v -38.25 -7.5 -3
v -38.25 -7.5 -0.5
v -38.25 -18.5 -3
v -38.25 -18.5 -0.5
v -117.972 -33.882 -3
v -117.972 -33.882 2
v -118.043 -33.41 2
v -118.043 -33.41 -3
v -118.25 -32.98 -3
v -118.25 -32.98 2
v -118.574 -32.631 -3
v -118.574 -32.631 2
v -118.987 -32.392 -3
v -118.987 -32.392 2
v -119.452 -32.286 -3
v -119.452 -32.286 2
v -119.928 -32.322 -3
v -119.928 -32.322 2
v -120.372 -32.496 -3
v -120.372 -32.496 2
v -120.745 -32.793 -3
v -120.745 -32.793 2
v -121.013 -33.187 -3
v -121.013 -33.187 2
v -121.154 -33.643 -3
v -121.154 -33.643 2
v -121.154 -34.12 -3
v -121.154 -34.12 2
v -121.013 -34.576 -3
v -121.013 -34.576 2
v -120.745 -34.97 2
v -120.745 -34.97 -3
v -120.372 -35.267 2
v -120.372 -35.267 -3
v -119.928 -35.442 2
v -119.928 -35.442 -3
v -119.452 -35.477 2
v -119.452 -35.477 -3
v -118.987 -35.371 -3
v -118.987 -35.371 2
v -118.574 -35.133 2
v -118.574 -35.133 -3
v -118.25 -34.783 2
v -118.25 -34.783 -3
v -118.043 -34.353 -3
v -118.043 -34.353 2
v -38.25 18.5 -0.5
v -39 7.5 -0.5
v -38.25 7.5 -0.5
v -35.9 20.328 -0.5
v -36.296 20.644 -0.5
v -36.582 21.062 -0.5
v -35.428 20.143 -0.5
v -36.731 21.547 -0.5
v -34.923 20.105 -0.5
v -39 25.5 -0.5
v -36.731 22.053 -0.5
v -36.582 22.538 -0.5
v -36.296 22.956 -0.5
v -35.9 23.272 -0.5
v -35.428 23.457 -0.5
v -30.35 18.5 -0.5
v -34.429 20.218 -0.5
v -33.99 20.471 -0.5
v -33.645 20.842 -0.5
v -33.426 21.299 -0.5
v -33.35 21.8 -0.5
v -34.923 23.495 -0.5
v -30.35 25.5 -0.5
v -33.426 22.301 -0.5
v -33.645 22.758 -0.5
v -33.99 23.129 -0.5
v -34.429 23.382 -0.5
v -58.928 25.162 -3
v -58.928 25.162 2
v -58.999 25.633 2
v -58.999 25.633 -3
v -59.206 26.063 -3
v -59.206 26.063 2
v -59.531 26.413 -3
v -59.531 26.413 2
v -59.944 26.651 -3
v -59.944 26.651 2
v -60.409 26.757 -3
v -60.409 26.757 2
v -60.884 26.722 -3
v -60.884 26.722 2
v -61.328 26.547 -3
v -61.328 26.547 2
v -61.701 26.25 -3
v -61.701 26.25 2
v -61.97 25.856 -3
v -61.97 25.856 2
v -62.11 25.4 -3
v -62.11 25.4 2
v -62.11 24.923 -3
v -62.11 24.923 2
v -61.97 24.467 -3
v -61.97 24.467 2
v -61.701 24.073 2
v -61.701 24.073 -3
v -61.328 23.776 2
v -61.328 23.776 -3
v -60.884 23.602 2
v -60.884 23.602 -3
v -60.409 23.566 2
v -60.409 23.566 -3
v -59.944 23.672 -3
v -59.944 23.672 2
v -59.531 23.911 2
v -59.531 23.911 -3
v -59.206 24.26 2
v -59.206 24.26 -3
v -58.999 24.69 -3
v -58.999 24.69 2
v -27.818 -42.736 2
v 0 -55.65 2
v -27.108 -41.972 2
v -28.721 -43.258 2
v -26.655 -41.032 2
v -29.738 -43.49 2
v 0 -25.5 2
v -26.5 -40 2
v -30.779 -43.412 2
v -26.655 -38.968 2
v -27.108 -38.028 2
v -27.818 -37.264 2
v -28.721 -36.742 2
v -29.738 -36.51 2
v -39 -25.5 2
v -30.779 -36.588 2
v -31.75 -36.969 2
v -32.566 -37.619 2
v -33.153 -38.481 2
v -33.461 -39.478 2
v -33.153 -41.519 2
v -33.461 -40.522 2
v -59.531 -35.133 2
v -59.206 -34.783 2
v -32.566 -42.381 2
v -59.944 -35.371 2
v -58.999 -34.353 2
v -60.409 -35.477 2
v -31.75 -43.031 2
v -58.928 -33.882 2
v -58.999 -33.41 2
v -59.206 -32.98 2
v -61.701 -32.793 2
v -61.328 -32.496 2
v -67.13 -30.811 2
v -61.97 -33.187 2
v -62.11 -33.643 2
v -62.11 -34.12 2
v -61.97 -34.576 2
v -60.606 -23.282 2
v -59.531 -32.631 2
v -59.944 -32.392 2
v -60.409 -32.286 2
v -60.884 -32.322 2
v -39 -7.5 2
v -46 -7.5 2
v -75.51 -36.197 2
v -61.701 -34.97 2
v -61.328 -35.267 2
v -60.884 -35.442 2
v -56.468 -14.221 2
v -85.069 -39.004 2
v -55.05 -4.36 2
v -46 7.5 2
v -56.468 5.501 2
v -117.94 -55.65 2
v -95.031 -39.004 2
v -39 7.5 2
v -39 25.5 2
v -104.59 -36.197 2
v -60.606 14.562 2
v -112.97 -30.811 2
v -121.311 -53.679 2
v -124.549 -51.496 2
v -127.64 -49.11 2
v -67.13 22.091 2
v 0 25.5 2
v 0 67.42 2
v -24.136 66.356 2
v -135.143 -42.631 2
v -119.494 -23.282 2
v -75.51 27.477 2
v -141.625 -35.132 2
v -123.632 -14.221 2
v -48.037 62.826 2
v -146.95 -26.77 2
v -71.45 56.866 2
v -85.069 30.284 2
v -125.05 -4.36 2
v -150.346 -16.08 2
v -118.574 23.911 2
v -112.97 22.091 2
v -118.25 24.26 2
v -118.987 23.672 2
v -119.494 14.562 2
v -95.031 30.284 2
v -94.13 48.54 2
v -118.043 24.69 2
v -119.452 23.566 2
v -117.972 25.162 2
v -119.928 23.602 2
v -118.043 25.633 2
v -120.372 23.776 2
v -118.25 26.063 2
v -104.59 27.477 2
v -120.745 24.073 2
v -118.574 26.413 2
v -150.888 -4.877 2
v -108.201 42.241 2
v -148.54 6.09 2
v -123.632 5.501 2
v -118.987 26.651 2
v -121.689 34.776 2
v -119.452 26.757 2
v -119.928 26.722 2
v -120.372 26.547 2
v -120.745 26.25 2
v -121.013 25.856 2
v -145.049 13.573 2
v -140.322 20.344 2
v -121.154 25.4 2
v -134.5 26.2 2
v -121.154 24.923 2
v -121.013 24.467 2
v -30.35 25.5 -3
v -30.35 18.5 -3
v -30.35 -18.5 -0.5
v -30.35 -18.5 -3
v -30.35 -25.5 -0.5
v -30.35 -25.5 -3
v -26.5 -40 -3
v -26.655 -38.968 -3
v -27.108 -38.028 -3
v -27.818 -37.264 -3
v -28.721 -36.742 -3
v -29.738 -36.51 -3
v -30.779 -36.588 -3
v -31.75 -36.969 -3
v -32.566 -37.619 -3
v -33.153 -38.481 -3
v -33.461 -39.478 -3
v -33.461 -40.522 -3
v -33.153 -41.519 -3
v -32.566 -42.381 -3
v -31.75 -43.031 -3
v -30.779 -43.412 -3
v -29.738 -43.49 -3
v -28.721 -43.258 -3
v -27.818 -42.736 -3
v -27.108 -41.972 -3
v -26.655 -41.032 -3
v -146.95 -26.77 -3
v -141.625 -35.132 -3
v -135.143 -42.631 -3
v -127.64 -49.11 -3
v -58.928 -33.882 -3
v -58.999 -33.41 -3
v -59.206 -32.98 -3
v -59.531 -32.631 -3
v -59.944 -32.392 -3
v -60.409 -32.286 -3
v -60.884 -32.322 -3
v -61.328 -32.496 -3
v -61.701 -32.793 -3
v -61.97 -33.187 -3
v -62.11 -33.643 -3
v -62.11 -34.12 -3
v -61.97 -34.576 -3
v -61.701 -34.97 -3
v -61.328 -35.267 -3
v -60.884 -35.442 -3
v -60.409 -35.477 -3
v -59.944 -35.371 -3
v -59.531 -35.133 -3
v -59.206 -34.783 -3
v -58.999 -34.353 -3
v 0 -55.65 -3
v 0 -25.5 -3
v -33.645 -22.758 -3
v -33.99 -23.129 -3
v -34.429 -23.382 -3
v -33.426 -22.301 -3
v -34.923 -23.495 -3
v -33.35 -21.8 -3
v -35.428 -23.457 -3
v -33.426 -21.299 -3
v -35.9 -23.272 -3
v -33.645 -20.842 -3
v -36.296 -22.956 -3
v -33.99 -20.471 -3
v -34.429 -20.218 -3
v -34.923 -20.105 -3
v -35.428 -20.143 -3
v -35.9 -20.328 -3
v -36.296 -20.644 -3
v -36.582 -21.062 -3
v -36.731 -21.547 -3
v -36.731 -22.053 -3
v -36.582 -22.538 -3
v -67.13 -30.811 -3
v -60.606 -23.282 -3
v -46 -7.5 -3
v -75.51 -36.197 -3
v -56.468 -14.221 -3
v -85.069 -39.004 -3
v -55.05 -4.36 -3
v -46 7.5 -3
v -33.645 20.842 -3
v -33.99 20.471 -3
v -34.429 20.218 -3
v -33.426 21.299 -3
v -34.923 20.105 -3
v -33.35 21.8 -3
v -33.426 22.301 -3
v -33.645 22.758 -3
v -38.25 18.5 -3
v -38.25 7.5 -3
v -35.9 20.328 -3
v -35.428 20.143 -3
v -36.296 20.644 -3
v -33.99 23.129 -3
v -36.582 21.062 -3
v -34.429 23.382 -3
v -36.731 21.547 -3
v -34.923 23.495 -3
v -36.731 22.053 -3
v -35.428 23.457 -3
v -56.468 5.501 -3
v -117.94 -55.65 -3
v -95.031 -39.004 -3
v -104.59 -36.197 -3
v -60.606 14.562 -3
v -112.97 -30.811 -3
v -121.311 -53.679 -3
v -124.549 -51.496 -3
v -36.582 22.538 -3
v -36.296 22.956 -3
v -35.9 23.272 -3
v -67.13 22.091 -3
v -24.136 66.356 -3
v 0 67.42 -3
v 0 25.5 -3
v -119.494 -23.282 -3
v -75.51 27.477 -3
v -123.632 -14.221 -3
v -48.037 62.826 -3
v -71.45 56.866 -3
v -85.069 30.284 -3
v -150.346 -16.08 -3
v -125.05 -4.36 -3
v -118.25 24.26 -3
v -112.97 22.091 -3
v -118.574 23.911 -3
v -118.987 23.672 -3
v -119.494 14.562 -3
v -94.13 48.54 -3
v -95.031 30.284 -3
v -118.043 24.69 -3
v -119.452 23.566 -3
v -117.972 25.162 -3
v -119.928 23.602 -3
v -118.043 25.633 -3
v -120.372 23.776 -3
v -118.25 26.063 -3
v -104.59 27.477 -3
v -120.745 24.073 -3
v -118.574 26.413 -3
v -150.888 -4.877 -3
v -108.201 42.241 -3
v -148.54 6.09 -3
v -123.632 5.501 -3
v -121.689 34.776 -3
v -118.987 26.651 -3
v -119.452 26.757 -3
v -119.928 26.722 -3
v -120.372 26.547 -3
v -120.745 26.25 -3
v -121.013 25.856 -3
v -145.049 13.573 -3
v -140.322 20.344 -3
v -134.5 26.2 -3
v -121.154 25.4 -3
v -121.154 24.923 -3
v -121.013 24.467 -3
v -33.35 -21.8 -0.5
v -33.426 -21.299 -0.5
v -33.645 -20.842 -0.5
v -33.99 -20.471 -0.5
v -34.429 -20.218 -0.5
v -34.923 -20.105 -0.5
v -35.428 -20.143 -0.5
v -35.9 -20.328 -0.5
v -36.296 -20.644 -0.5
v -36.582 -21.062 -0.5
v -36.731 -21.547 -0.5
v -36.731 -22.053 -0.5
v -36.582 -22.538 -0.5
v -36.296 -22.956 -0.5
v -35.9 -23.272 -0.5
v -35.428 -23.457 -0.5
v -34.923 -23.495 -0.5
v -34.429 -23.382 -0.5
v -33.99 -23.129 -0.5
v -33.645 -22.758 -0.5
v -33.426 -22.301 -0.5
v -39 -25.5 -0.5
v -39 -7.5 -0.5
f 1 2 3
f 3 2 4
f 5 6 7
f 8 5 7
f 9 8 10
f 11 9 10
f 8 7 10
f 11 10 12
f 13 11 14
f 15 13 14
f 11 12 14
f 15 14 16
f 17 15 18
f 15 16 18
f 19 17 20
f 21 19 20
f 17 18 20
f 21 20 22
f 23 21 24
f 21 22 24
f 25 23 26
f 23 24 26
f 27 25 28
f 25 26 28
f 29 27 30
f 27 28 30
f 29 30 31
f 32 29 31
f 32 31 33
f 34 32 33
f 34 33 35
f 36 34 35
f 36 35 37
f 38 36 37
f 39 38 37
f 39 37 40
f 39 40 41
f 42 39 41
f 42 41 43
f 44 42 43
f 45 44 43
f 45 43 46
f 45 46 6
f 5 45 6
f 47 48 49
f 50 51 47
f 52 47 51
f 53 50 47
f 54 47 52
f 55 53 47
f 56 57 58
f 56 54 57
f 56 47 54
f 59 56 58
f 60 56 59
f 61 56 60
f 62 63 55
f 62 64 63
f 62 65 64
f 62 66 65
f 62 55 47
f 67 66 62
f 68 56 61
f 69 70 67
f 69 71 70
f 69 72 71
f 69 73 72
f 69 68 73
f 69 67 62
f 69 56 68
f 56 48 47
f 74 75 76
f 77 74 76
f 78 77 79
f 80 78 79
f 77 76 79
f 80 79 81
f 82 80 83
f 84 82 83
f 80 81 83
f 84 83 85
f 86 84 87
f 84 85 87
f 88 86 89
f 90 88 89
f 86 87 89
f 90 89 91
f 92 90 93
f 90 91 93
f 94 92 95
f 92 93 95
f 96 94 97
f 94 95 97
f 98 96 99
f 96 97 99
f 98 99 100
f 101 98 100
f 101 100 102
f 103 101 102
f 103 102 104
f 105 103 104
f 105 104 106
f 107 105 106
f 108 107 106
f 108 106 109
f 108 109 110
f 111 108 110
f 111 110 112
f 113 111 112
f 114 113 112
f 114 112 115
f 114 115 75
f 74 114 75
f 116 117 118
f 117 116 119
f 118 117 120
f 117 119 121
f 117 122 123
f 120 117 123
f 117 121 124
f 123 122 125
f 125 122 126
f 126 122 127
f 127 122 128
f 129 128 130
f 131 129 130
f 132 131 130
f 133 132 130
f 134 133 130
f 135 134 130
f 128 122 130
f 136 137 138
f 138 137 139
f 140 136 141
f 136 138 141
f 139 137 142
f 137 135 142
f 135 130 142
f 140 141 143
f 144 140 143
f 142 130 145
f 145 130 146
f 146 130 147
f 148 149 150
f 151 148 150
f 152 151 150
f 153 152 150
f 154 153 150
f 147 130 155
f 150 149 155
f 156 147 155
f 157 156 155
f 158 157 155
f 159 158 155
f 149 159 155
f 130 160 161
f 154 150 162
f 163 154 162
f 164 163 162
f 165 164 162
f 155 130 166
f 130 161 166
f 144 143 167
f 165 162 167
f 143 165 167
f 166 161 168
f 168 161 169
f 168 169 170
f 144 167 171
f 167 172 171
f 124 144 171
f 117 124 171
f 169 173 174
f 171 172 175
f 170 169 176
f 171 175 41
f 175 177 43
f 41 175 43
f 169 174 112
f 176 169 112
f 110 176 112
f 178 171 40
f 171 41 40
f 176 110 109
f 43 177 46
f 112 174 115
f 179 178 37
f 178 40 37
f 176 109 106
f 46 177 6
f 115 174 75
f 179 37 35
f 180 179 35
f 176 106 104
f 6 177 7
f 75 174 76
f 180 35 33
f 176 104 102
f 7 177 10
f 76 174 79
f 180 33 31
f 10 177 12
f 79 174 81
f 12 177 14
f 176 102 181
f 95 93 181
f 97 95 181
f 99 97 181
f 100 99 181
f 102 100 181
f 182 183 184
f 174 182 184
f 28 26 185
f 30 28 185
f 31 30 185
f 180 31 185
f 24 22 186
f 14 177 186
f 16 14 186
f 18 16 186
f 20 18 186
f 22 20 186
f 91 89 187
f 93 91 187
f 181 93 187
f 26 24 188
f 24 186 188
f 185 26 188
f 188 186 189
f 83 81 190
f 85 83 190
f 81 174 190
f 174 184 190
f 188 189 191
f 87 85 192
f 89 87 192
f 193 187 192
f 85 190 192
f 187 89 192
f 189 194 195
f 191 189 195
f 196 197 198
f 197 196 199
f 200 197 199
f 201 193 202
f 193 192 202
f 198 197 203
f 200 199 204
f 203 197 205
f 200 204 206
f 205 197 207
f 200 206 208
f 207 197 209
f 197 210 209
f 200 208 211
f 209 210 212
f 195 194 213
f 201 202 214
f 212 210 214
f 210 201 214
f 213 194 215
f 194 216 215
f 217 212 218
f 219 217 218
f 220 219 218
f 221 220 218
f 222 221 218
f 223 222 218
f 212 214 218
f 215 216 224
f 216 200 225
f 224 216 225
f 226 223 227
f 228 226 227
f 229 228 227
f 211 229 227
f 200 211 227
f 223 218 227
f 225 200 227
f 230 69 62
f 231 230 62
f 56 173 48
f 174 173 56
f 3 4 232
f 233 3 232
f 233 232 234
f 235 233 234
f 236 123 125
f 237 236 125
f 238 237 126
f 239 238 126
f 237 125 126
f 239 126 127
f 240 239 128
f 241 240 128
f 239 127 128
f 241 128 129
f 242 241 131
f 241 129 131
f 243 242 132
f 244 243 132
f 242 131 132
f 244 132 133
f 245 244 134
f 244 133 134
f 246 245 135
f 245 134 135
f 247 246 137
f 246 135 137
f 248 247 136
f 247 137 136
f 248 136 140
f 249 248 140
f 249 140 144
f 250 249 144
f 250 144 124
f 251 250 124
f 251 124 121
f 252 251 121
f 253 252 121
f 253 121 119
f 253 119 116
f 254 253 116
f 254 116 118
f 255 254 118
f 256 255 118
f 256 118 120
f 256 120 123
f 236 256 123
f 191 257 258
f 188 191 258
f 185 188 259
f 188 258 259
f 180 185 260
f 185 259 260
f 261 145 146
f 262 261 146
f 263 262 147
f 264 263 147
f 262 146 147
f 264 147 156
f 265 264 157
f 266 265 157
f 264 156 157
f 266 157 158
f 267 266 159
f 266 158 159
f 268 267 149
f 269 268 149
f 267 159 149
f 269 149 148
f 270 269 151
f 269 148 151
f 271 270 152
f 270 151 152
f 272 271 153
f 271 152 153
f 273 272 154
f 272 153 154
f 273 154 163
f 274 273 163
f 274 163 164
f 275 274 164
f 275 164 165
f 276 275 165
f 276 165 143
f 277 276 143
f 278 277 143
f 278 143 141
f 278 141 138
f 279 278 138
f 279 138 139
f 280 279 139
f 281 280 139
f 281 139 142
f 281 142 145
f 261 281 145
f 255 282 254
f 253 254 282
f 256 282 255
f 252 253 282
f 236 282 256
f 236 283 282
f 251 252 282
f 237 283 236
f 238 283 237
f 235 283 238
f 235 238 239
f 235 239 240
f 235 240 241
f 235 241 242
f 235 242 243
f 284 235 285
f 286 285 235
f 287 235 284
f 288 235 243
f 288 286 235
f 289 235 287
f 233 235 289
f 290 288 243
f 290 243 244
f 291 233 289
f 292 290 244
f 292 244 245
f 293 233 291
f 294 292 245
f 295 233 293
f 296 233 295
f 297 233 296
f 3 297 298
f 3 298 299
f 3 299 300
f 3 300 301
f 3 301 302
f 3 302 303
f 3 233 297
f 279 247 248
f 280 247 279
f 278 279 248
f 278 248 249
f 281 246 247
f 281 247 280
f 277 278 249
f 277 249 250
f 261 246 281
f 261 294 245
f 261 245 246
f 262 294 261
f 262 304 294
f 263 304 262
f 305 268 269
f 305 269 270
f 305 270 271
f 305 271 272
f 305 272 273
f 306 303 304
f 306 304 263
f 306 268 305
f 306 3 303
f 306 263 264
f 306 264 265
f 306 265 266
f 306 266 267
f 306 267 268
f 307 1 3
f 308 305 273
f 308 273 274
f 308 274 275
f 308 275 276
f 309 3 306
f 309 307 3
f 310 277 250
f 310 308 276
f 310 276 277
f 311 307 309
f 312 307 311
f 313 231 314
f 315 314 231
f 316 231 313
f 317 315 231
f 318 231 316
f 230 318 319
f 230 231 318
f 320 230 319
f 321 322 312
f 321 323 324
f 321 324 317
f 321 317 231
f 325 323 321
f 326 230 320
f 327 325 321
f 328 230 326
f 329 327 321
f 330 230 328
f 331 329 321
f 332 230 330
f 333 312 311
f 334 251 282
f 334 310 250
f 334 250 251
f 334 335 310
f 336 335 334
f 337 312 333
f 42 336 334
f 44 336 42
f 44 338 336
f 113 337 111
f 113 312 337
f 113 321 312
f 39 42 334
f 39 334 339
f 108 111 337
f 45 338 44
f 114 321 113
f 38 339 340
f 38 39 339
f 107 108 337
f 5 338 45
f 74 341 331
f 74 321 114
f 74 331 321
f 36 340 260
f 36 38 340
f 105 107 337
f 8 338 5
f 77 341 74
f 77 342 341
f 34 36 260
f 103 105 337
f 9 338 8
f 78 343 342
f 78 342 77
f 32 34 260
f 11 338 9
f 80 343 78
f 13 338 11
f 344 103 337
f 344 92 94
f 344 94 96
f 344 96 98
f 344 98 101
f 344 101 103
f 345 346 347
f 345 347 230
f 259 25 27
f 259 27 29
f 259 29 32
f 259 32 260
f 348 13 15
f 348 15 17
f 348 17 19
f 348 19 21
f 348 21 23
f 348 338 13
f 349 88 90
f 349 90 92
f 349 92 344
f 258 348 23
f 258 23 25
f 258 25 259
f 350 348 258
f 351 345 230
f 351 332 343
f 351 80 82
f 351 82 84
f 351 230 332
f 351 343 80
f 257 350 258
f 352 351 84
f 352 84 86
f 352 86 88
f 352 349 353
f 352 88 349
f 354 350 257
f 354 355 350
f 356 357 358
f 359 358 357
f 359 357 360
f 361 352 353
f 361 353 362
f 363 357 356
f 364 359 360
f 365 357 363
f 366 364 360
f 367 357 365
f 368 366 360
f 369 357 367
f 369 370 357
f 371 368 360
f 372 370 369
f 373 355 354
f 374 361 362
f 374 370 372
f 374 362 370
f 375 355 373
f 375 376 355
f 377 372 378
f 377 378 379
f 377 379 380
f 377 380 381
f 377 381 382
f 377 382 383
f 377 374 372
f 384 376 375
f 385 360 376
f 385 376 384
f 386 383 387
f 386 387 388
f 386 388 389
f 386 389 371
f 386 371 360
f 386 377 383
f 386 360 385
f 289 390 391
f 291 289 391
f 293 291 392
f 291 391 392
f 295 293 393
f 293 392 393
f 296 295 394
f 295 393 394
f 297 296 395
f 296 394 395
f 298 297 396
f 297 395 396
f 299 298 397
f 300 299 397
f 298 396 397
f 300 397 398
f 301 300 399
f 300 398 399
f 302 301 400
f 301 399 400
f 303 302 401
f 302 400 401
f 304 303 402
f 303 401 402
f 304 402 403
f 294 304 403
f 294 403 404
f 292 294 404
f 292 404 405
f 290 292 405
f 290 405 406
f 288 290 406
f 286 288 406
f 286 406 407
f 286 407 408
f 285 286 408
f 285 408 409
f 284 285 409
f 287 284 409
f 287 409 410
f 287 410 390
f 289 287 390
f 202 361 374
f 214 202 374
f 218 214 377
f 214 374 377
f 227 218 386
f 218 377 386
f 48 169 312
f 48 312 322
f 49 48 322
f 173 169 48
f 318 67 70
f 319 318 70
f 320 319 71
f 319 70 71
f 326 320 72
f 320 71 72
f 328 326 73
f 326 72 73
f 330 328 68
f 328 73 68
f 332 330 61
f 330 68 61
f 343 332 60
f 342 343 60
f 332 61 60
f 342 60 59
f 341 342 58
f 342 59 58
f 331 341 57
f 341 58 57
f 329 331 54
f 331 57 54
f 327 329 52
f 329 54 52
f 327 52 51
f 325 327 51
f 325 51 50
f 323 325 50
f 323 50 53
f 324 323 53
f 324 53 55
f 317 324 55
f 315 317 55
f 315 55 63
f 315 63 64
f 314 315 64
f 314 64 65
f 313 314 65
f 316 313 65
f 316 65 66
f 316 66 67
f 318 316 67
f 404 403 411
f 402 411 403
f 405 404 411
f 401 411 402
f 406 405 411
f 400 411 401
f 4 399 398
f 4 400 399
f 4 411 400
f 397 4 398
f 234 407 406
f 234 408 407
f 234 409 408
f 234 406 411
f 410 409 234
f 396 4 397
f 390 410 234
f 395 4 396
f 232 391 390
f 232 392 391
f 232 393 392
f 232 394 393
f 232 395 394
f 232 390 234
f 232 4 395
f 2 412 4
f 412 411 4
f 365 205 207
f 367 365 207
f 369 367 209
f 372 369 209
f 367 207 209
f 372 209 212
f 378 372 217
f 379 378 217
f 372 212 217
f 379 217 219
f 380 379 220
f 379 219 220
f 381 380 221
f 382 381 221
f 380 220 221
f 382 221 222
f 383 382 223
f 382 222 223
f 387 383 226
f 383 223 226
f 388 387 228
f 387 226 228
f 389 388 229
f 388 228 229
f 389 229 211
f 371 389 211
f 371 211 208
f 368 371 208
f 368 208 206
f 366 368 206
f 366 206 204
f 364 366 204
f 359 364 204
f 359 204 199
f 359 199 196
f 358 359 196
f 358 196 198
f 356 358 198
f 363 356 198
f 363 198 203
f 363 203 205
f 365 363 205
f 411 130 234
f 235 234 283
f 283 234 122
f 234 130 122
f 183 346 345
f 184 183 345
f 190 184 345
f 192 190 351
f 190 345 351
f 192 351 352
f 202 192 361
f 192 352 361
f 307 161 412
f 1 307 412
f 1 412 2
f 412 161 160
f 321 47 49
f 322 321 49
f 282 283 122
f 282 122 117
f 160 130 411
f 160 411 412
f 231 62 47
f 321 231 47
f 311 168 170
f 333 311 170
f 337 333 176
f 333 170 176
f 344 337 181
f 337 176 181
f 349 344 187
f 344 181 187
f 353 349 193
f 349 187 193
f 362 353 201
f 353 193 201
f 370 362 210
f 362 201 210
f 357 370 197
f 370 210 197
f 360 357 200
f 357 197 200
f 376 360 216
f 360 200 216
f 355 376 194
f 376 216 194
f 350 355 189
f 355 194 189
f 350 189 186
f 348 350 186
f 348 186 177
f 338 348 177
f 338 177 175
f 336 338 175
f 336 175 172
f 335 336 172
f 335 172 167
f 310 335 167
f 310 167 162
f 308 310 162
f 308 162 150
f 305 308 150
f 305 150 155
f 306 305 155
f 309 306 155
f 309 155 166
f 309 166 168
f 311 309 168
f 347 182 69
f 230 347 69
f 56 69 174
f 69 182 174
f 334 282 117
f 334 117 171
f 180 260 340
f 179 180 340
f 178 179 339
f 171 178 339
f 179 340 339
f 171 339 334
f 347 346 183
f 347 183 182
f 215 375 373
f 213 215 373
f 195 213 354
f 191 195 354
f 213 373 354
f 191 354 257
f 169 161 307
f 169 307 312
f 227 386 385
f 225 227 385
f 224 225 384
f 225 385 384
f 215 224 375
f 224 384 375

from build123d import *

# Parameters (mm, degrees)
PAD001_DEPTH    = 5
SKETCH009_R     = 35
SKETCH009_R_2   = 1.6
POCKET002_DEPTH = 5.001
SKETCH010_R     = 3.5
SKETCH010_R_2   = 1.7
POCKET003_DEPTH = 5.001
COPYSKETCH026_W = 39
COPYSKETCH026_H = 51
POCKET029_DEPTH = 7.5
SKETCH034_W     = 8
SKETCH034_H     = 15
POCKET035_DEPTH = 5.001


with BuildPart() as part:
    # Sketch008 → Pad001 (new body)
    with BuildSketch(Plane.XY):
        with BuildLine():
            Line((0, 67.42), (0, -55.65))
            Line((0, -55.65), (-117.94, -55.65))
            ThreePointArc((-127.64, -49.11), (-122.947197, -52.613151), (-117.94, -55.65))
            ThreePointArc((-146.95, -26.77), (-138.520798, -38.999541), (-127.64, -49.11))
            ThreePointArc((-148.54, 6.09), (-150.980867, -10.496574), (-146.95, -26.77))
            ThreePointArc((-134.5, 26.2), (-142.831473, 17.060618), (-148.54, 6.09))
            ThreePointArc((-94.13, 48.54), (-115.023795, 38.650843), (-134.5, 26.2))
            ThreePointArc((0, 67.42), (-48.036997, 62.826084), (-94.13, 48.54))
        make_face()
    extrude(amount=PAD001_DEPTH)

    # Sketch009 (on Face10 of Pad001) → Pocket002 (cut, through all)
    with BuildSketch(Plane.XY.offset(5)):
        with Locations((-90.05, -4.36)):
            Circle(SKETCH009_R)
        with Locations((-119.571708, 25.161708)):
            Circle(SKETCH009_R_2)
        with Locations((-119.571708, -33.881708)):
            Circle(SKETCH009_R_2)
        with Locations((-60.528292, -33.881708)):
            Circle(SKETCH009_R_2)
        with Locations((-60.528292, 25.161708)):
            Circle(SKETCH009_R_2)
    extrude(amount=-POCKET002_DEPTH, mode=Mode.SUBTRACT)

    # Sketch010 (on Face5 of Pocket002) → Pocket003 (cut, through all)
    with BuildSketch(Plane.XY.offset(5)):
        with Locations((-30, -40)):
            Circle(SKETCH010_R)
        with Locations((-35.05, 21.8)):
            Circle(SKETCH010_R_2)
        with Locations((-35.05, -21.8)):
            Circle(SKETCH010_R_2)
        Polygon((0, 25.5), (-30.35, 25.5), (-30.35, 18.5), (-38.25, 18.5), (-38.25, -18.5), (-30.35, -18.5), (-30.35, -25.5), (0, -25.5), align=None)
    extrude(amount=-POCKET003_DEPTH, mode=Mode.SUBTRACT)

    # CopySketch026 → Pocket029 (cut)
    with BuildSketch(Plane.XY.offset(10)):
        with Locations((-19.5, 0)):
            Rectangle(COPYSKETCH026_W, COPYSKETCH026_H)
    extrude(amount=-POCKET029_DEPTH, mode=Mode.SUBTRACT)

    # Sketch034 (on Face5 of Pocket029) → Pocket035 (cut, through all)
    with BuildSketch(Plane.XY.offset(5)):
        with Locations((-42, 0)):
            Rectangle(SKETCH034_W, SKETCH034_H)
    extrude(amount=-POCKET035_DEPTH, mode=Mode.SUBTRACT)


with BuildPart() as part_1:
    # Body001 placement: moved
    add(part.part.moved(Location((0, 0, -3))))


solid = part_1.part
